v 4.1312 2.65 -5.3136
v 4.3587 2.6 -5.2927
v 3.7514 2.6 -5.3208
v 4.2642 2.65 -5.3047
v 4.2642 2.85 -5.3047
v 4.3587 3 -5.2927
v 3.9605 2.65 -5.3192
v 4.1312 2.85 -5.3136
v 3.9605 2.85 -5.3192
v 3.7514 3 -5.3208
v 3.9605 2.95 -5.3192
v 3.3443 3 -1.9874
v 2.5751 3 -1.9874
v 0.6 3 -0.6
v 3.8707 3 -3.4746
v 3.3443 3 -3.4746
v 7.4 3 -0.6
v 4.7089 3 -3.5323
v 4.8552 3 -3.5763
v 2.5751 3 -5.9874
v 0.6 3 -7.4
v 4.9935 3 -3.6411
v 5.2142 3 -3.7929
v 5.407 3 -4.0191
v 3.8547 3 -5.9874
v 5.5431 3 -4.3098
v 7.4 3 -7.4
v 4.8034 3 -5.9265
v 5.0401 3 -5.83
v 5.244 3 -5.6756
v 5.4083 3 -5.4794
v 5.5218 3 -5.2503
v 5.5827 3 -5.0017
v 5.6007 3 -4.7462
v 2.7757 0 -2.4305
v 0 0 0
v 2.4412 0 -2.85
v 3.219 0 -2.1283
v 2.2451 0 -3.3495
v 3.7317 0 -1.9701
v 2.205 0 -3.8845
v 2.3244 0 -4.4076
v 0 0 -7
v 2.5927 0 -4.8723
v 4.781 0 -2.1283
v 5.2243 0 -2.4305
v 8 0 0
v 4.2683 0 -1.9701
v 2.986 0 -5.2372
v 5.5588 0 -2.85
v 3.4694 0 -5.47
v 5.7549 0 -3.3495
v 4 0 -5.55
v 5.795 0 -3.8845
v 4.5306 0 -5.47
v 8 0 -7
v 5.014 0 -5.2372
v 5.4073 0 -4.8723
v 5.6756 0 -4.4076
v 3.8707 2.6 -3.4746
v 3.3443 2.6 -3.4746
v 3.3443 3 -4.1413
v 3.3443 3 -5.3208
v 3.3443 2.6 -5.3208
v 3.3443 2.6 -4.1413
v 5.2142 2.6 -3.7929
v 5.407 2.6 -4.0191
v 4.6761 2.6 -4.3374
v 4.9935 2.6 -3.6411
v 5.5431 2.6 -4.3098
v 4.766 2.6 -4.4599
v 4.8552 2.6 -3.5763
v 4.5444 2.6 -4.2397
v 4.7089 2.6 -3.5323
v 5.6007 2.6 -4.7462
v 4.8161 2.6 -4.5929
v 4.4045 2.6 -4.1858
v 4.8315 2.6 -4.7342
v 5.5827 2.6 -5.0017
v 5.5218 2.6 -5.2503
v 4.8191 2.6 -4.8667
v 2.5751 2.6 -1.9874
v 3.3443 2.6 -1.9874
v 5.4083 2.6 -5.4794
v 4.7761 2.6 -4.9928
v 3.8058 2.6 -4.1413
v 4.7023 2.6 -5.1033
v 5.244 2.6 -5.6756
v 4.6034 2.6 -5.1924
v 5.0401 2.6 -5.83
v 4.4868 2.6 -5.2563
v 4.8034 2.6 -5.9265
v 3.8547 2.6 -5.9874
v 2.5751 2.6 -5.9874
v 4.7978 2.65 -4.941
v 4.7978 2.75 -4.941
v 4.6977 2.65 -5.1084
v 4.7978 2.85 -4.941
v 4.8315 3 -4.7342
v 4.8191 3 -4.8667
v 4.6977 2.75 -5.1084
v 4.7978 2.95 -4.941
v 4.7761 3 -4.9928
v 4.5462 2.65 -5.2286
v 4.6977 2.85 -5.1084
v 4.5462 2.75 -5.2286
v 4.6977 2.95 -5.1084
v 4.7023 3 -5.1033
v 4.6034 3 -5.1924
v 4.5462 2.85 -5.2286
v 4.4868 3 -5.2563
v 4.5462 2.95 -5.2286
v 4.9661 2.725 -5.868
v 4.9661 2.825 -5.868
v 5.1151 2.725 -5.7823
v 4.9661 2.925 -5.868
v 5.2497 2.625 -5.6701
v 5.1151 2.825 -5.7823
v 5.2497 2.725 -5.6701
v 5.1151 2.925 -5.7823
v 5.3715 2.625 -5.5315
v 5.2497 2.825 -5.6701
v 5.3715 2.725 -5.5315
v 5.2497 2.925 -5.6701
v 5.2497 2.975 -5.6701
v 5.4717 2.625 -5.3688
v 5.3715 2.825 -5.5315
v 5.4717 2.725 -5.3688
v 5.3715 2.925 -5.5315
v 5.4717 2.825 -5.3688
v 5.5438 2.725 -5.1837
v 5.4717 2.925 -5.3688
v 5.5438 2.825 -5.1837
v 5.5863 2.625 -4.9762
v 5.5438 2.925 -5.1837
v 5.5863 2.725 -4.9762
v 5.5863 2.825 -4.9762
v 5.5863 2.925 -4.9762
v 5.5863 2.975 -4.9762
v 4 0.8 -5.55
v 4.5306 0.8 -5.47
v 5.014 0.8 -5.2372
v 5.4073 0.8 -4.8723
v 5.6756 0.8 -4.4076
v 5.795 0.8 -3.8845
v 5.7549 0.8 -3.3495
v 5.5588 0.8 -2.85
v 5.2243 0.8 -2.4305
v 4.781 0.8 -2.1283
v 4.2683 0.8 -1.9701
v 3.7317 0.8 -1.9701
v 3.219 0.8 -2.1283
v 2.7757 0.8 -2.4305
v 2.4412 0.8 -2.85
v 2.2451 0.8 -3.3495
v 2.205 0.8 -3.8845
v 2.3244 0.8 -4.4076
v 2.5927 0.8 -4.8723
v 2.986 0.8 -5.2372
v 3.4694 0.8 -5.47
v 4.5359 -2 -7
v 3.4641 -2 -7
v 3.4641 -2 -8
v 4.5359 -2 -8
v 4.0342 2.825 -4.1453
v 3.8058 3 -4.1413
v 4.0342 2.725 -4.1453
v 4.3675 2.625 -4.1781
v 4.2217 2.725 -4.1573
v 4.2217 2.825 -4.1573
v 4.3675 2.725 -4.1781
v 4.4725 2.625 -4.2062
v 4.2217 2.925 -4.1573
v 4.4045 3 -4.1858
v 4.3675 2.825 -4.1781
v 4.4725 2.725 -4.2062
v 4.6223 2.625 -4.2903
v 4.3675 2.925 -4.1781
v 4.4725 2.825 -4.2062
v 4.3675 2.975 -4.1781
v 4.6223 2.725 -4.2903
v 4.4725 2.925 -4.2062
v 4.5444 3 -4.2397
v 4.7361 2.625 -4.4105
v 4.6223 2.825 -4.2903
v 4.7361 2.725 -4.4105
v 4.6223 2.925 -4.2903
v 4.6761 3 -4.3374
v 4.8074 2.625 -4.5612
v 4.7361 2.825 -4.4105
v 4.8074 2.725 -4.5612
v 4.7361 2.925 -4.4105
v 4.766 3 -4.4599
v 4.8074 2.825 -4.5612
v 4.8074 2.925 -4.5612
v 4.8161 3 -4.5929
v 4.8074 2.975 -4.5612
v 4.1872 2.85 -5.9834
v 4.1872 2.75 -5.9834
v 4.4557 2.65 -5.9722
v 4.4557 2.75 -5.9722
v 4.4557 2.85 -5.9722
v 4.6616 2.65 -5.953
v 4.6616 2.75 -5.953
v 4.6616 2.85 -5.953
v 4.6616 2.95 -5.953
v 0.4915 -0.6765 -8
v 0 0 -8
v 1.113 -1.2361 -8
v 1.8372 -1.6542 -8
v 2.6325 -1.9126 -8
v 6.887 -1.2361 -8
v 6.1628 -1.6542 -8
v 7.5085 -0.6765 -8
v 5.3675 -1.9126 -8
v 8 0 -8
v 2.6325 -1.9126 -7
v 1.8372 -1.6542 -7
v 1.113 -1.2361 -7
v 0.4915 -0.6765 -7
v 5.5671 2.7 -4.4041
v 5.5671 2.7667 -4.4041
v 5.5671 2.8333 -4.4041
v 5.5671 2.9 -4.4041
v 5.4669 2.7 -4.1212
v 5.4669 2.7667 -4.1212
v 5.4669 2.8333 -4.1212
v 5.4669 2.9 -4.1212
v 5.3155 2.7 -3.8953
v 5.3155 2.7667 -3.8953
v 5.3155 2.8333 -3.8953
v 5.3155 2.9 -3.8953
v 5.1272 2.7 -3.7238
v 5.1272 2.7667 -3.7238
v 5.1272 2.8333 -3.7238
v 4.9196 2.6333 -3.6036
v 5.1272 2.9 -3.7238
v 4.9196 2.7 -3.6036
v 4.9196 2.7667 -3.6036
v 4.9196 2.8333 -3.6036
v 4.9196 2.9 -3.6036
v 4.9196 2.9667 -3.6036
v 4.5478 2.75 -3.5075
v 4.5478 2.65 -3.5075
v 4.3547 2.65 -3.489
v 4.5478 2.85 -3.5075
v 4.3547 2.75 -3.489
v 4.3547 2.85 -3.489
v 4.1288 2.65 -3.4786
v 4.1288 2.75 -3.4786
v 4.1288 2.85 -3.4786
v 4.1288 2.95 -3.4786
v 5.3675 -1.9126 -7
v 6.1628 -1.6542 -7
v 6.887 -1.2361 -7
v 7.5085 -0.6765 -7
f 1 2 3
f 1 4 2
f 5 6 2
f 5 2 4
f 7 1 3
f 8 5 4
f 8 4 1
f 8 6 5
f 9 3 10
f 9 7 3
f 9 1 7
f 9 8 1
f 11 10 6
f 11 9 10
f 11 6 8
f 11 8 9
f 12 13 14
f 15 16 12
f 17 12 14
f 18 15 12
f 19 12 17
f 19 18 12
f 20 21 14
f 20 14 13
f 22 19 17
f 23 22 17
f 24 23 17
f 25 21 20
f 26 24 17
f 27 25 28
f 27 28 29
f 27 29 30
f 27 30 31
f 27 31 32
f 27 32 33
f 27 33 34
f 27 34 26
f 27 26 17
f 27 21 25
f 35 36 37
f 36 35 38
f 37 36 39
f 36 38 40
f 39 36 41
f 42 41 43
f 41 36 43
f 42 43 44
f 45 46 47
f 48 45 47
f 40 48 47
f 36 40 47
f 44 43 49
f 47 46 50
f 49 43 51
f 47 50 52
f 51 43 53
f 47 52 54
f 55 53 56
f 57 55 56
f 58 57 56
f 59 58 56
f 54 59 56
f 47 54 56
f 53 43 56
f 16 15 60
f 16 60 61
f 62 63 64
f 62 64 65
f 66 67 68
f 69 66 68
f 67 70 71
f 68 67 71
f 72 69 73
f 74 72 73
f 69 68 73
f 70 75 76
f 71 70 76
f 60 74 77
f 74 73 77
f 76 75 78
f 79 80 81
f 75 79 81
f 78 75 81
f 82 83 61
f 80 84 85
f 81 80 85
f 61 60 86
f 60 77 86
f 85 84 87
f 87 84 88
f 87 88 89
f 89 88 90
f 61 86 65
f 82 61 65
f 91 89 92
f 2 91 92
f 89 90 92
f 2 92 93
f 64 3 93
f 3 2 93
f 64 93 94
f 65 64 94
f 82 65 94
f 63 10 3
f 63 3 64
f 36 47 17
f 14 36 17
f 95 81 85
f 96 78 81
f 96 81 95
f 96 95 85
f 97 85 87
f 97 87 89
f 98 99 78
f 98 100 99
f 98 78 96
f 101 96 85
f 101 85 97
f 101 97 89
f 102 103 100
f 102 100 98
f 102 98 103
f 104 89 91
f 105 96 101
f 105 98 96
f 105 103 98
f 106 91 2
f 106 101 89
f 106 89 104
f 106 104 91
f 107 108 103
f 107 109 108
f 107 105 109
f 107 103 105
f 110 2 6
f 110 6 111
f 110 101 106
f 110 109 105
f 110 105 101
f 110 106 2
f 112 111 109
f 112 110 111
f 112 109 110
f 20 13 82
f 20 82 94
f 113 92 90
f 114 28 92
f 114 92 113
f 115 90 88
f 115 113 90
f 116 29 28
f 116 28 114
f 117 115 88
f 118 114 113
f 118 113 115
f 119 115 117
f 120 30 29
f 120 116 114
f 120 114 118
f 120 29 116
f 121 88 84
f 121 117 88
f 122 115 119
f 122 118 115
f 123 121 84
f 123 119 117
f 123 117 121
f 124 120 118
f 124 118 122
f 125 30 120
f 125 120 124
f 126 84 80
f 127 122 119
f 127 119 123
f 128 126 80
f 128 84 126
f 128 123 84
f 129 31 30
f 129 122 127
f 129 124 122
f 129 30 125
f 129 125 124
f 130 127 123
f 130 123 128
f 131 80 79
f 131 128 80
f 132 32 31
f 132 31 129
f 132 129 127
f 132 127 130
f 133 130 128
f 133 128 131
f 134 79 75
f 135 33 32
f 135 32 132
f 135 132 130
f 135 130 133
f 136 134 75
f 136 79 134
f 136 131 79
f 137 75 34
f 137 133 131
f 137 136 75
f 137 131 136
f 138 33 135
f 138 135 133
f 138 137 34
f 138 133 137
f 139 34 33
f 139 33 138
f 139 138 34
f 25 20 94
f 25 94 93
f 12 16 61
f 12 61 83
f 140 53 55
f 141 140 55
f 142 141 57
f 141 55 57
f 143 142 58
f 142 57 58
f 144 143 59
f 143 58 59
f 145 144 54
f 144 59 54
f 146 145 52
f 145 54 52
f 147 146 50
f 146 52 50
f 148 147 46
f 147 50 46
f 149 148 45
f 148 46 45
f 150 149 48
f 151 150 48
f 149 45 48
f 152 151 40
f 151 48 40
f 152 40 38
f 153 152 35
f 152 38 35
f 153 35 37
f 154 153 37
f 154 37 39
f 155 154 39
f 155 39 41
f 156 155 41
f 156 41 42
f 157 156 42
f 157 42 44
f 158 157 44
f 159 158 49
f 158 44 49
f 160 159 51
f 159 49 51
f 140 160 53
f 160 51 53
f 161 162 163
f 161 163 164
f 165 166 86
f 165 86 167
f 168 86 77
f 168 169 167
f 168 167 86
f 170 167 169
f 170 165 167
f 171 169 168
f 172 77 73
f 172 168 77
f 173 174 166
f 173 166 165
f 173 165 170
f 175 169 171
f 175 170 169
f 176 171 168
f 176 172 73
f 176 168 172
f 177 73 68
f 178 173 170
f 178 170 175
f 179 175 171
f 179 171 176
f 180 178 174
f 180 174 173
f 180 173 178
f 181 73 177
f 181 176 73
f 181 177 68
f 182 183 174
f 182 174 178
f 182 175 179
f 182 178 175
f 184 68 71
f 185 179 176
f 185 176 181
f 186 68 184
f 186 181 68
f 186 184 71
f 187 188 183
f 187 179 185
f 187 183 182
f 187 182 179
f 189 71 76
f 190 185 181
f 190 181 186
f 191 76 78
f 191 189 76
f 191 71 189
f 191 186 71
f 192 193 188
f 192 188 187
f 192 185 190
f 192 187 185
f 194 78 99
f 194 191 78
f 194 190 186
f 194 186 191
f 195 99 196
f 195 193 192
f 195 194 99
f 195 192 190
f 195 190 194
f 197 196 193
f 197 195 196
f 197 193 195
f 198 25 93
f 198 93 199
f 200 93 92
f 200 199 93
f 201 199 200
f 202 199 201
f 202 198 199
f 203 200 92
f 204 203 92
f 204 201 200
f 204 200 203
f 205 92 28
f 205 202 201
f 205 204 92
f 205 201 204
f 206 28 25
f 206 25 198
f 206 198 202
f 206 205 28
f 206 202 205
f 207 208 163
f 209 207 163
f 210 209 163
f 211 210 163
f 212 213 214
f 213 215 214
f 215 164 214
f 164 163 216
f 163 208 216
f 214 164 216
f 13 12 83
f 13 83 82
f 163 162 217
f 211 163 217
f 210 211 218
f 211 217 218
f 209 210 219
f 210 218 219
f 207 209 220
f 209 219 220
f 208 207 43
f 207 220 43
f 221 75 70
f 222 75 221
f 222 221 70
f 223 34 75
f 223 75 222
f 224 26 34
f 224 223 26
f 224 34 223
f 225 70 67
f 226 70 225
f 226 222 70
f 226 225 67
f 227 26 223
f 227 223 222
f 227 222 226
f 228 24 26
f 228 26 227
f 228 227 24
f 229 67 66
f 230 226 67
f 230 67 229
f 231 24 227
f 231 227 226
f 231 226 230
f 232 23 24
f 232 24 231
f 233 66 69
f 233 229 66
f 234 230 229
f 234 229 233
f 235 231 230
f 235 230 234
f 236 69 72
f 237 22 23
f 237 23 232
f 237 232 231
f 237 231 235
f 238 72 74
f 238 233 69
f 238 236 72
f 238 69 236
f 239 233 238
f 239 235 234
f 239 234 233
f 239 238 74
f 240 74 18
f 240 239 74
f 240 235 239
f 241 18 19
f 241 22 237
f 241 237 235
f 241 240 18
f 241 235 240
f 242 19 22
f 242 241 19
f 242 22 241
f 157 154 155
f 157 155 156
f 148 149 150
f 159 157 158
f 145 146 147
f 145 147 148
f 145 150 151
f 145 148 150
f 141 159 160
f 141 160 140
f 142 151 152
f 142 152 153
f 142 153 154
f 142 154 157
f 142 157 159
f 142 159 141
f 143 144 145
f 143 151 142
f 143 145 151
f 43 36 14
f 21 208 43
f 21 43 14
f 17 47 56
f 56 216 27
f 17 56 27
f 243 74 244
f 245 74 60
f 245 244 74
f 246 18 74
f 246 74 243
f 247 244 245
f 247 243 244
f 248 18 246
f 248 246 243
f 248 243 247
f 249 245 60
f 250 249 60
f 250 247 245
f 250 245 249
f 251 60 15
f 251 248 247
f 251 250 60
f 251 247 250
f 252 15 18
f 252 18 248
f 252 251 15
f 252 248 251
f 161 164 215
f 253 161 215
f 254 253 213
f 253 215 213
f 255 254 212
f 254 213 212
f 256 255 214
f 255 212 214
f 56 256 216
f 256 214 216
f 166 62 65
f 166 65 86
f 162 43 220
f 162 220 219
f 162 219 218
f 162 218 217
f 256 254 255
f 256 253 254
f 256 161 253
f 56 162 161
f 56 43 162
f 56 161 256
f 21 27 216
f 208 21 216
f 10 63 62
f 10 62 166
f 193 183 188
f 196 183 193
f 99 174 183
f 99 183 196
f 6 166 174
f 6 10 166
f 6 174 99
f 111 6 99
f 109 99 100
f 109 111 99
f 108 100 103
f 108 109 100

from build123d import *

# Parameters (mm, degrees)
SKETCH1_W               = 8
SKETCH1_H               = 8
BOSS_EXTRUDE1_DEPTH     = 3
CUT_EXTRUDE1_DEPTH      = 12.704699911
CUT_EXTRUDE1_DEPTH_BACK = 12.704699911
CUT_EXTRUDE2_DEPTH      = 11
SKETCH4_R               = 1.8
CUT_EXTRUDE3_DEPTH      = 0.8
SKETCH5_W               = 8
SKETCH5_H               = 1
BOSS_EXTRUDE2_DEPTH     = 2
FILLET1_R               = 4
CUT_EXTRUDE4_DEPTH      = 0.4


with BuildPart() as part:
    # Sketch1 → Boss-Extrude1 (new body)
    with BuildSketch(Plane(origin=(0, 0, 0), x_dir=(1, 0, 0), z_dir=(0, 1, 0))):
        with Locations((4, 4)):
            Rectangle(SKETCH1_W, SKETCH1_H)
    extrude(amount=BOSS_EXTRUDE1_DEPTH)

    # Sketch2 → Cut-Extrude1 (cut, two sides: drawn at the far end of the back side and taken through both)
    with BuildSketch(Plane.XY.offset(-CUT_EXTRUDE1_DEPTH_BACK)):
        Polygon((0, 0), (0.6, 3), (0, 3), align=None)
        Polygon((8, 0), (7.4, 3), (8, 3), align=None)
    extrude(amount=CUT_EXTRUDE1_DEPTH + CUT_EXTRUDE1_DEPTH_BACK, mode=Mode.SUBTRACT)

    # Sketch3 → Cut-Extrude2 (cut)
    with BuildSketch(Plane(origin=(0, 0, 0), x_dir=(0, 0, -1), z_dir=(1, 0, 0))):
        Polygon((0, 0), (0.6, 3), (0, 3), align=None)
        Polygon((8, 3), (7.4, 3), (8, 0), align=None)
    extrude(amount=CUT_EXTRUDE2_DEPTH, mode=Mode.SUBTRACT)

    # Sketch4 → Cut-Extrude3 (cut)
    with BuildSketch(Plane.XZ):
        with Locations(Location((4, -3.75, 0), (0, 0, 270))):
            Circle(SKETCH4_R)
    extrude(amount=-CUT_EXTRUDE3_DEPTH, mode=Mode.SUBTRACT)

    # Sketch5 → Boss-Extrude2 (add)
    with BuildSketch(Plane.XZ):
        with Locations((4, -7.5)):
            Rectangle(SKETCH5_W, SKETCH5_H)
    extrude(amount=BOSS_EXTRUDE2_DEPTH)

    # Fillet1
    # the kernel refuses this fillet: 4 mm, written as the material it takes off along each edge
    with BuildSketch(Plane(origin=(8, -2, -16.660254038), x_dir=(0, 1, 0), z_dir=(0, 0, 1)), Plane(origin=(0, -2, 1.660254038), x_dir=(0, 1, 0), z_dir=(0, 0, -1))) as fillet1_piece_1:
        with BuildLine():
            CenterArc((4, 3.464101615), FILLET1_R, 180, 60)
            Line((0, 3.464101615), (-0.08, 3.464101615))
            Line((-0.08, 3.464101615), (-0.08, 0))
            Line((-0.08, 0), (0, -0.08))
            ThreePointArc((0, -0.08), (1, -0.08), (1.96, -0.069282032))
            Line((1.96, -0.069282032), (2, 0))
        make_face()
    extrude(amount=18.320508076, mode=Mode.SUBTRACT)

    # Sketch6 → Cut-Extrude4 (cut)
    with BuildSketch(Plane(origin=(0, 3, 0), x_dir=(1, 0, 0), z_dir=(0, 1, 0))):
        with BuildLine():
            Line((2.575068598, 1.987434605), (2.575068598, 5.987434605))
            Line((2.575068598, 5.987434605), (3.854716034, 5.987434605))
            add(Edge.make_bspline(
                [(3.854716034, 5.987434605), (3.91267733, 5.987371309), (4.0235352, 5.987250247), (4.181667245, 5.983886636), (4.324041461, 5.979125075), (4.450446542, 5.973194752), (4.561327274, 5.964345571), (4.656186257, 5.954098352), (4.735620814, 5.943075064), (4.782397472, 5.931667436), (4.803433983, 5.926537169)],
                knots=[0, 0, 0, 0, 1.460485487, 2.793352117, 3.985295279, 5.050041172, 5.981765236, 6.787433016, 7.454681457, 8, 8, 8, 8], degree=3))
            add(Edge.make_bspline(
                [(4.803433983, 5.926537169), (4.831407427, 5.918560862), (4.886928159, 5.902729762), (4.966472056, 5.868980371), (5.043139776, 5.829866627), (5.115968073, 5.783250114), (5.185204512, 5.72995844), (5.251054895, 5.670426205), (5.313870394, 5.604384669), (5.372782037, 5.531964292), (5.426738172, 5.453530256), (5.473369829, 5.368966598), (5.512437408, 5.278640875), (5.545722335, 5.183231873), (5.570280113, 5.081716653), (5.587466094, 4.974800554), (5.59942968, 4.862436815), (5.600276739, 4.785544235), (5.600709624, 4.746248708)],
                knots=[0, 0, 0, 0, 0.907145743, 1.80047177, 2.69161667, 3.591261238, 4.495029544, 5.415863088, 6.359363025, 7.337192411, 8.326890979, 9.326929023, 10.346104993, 11.395420813, 12.477187422, 13.601053412, 14.774031606, 16, 16, 16, 16], degree=3))
            add(Edge.make_bspline(
                [(5.600709624, 4.746248708), (5.599475039, 4.686573982), (5.597098394, 4.571696857), (5.570507962, 4.407006575), (5.529951011, 4.256572619), (5.470674098, 4.121843981), (5.398403226, 4.002291963), (5.318795373, 3.894516382), (5.227894903, 3.801765706), (5.129684965, 3.722543108), (5.025895009, 3.65771062), (4.921917172, 3.602441845), (4.816348426, 3.559949444), (4.744371889, 3.541435164), (4.708882701, 3.5323064)],
                knots=[0, 0, 0, 0, 1.312386234, 2.526415563, 3.661883817, 4.733421185, 5.753802465, 6.732107337, 7.675884281, 8.604170108, 9.50284679, 10.365392406, 11.194030444, 12, 12, 12, 12], degree=3))
            add(Edge.make_bspline(
                [(4.708882701, 3.5323064), (4.683552258, 3.527487955), (4.630158709, 3.517331247), (4.545479732, 3.507206857), (4.452921022, 3.496000262), (4.352101878, 3.488690691), (4.243144264, 3.481845584), (4.126090489, 3.478613784), (4.001107836, 3.47472012), (3.91508314, 3.474650156), (3.870741675, 3.474614092)],
                knots=[0, 0, 0, 0, 0.735353946, 1.55003838, 2.431865514, 3.394945452, 4.432993119, 5.54609699, 6.735134699, 8, 8, 8, 8], degree=3))
            Line((3.870741675, 3.474614092), (3.344299367, 3.474614092))
            Line((3.344299367, 3.474614092), (3.344299367, 1.987434605))
            Line((3.344299367, 1.987434605), (2.575068598, 1.987434605))
        make_face()
        with BuildLine():
            Line((3.344299367, 5.320767939), (3.344299367, 4.141280759))
            Line((3.344299367, 4.141280759), (3.805837829, 4.141280759))
            add(Edge.make_bspline(
                [(3.805837829, 4.141280759), (3.845638333, 4.141332297), (3.921781705, 4.141430897), (4.031030553, 4.144970031), (4.129922714, 4.149290201), (4.218664819, 4.156440966), (4.296721198, 4.165865503), (4.364614575, 4.177138437), (4.422424078, 4.189235472), (4.484937186, 4.209282199), (4.551776196, 4.241715975), (4.623152404, 4.288331456), (4.685856319, 4.344065763), (4.738034287, 4.409523776), (4.779712931, 4.482251421), (4.809554871, 4.56150336), (4.828823783, 4.645966113), (4.830583823, 4.704475652), (4.831478855, 4.734229477)],
                knots=[0, 0, 0, 0, 1.411705958, 2.700771114, 3.876961699, 4.922619712, 5.858038221, 6.66485904, 7.363650596, 7.950905807, 8.989198271, 9.987739806, 10.967313358, 11.951275539, 12.944273208, 13.927870418, 14.946261014, 16, 16, 16, 16], degree=3))
            add(Edge.make_bspline(
                [(4.831478855, 4.734229477), (4.830219195, 4.770469172), (4.827776882, 4.840733161), (4.800844983, 4.940800809), (4.759292142, 5.031613413), (4.699883375, 5.110345382), (4.628118983, 5.176552494), (4.547458802, 5.231639165), (4.456180297, 5.270189236), (4.391579581, 5.285125966), (4.358722444, 5.292723067)],
                knots=[0, 0, 0, 0, 1.085904563, 2.105425768, 3.088705091, 4.068969419, 5.045188284, 6.010769642, 6.988240112, 8, 8, 8, 8], degree=3))
            add(Edge.make_bspline(
                [(4.358722444, 5.292723067), (4.344583268, 5.294984513), (4.31319868, 5.300004222), (4.261031108, 5.305242912), (4.199316862, 5.310007496), (4.127981551, 5.313919362), (4.047307931, 5.316977535), (3.957029905, 5.319657249), (3.857385235, 5.319872528), (3.787674783, 5.320461199), (3.751350649, 5.320767939)],
                knots=[0, 0, 0, 0, 0.564603001, 1.253243608, 2.066786758, 3.005752288, 4.070476343, 5.250658742, 6.567396469, 8, 8, 8, 8], degree=3))
            Line((3.751350649, 5.320767939), (3.344299367, 5.320767939))
        make_face(mode=Mode.SUBTRACT)
    extrude(amount=-CUT_EXTRUDE4_DEPTH, mode=Mode.SUBTRACT)


solid = part.part
